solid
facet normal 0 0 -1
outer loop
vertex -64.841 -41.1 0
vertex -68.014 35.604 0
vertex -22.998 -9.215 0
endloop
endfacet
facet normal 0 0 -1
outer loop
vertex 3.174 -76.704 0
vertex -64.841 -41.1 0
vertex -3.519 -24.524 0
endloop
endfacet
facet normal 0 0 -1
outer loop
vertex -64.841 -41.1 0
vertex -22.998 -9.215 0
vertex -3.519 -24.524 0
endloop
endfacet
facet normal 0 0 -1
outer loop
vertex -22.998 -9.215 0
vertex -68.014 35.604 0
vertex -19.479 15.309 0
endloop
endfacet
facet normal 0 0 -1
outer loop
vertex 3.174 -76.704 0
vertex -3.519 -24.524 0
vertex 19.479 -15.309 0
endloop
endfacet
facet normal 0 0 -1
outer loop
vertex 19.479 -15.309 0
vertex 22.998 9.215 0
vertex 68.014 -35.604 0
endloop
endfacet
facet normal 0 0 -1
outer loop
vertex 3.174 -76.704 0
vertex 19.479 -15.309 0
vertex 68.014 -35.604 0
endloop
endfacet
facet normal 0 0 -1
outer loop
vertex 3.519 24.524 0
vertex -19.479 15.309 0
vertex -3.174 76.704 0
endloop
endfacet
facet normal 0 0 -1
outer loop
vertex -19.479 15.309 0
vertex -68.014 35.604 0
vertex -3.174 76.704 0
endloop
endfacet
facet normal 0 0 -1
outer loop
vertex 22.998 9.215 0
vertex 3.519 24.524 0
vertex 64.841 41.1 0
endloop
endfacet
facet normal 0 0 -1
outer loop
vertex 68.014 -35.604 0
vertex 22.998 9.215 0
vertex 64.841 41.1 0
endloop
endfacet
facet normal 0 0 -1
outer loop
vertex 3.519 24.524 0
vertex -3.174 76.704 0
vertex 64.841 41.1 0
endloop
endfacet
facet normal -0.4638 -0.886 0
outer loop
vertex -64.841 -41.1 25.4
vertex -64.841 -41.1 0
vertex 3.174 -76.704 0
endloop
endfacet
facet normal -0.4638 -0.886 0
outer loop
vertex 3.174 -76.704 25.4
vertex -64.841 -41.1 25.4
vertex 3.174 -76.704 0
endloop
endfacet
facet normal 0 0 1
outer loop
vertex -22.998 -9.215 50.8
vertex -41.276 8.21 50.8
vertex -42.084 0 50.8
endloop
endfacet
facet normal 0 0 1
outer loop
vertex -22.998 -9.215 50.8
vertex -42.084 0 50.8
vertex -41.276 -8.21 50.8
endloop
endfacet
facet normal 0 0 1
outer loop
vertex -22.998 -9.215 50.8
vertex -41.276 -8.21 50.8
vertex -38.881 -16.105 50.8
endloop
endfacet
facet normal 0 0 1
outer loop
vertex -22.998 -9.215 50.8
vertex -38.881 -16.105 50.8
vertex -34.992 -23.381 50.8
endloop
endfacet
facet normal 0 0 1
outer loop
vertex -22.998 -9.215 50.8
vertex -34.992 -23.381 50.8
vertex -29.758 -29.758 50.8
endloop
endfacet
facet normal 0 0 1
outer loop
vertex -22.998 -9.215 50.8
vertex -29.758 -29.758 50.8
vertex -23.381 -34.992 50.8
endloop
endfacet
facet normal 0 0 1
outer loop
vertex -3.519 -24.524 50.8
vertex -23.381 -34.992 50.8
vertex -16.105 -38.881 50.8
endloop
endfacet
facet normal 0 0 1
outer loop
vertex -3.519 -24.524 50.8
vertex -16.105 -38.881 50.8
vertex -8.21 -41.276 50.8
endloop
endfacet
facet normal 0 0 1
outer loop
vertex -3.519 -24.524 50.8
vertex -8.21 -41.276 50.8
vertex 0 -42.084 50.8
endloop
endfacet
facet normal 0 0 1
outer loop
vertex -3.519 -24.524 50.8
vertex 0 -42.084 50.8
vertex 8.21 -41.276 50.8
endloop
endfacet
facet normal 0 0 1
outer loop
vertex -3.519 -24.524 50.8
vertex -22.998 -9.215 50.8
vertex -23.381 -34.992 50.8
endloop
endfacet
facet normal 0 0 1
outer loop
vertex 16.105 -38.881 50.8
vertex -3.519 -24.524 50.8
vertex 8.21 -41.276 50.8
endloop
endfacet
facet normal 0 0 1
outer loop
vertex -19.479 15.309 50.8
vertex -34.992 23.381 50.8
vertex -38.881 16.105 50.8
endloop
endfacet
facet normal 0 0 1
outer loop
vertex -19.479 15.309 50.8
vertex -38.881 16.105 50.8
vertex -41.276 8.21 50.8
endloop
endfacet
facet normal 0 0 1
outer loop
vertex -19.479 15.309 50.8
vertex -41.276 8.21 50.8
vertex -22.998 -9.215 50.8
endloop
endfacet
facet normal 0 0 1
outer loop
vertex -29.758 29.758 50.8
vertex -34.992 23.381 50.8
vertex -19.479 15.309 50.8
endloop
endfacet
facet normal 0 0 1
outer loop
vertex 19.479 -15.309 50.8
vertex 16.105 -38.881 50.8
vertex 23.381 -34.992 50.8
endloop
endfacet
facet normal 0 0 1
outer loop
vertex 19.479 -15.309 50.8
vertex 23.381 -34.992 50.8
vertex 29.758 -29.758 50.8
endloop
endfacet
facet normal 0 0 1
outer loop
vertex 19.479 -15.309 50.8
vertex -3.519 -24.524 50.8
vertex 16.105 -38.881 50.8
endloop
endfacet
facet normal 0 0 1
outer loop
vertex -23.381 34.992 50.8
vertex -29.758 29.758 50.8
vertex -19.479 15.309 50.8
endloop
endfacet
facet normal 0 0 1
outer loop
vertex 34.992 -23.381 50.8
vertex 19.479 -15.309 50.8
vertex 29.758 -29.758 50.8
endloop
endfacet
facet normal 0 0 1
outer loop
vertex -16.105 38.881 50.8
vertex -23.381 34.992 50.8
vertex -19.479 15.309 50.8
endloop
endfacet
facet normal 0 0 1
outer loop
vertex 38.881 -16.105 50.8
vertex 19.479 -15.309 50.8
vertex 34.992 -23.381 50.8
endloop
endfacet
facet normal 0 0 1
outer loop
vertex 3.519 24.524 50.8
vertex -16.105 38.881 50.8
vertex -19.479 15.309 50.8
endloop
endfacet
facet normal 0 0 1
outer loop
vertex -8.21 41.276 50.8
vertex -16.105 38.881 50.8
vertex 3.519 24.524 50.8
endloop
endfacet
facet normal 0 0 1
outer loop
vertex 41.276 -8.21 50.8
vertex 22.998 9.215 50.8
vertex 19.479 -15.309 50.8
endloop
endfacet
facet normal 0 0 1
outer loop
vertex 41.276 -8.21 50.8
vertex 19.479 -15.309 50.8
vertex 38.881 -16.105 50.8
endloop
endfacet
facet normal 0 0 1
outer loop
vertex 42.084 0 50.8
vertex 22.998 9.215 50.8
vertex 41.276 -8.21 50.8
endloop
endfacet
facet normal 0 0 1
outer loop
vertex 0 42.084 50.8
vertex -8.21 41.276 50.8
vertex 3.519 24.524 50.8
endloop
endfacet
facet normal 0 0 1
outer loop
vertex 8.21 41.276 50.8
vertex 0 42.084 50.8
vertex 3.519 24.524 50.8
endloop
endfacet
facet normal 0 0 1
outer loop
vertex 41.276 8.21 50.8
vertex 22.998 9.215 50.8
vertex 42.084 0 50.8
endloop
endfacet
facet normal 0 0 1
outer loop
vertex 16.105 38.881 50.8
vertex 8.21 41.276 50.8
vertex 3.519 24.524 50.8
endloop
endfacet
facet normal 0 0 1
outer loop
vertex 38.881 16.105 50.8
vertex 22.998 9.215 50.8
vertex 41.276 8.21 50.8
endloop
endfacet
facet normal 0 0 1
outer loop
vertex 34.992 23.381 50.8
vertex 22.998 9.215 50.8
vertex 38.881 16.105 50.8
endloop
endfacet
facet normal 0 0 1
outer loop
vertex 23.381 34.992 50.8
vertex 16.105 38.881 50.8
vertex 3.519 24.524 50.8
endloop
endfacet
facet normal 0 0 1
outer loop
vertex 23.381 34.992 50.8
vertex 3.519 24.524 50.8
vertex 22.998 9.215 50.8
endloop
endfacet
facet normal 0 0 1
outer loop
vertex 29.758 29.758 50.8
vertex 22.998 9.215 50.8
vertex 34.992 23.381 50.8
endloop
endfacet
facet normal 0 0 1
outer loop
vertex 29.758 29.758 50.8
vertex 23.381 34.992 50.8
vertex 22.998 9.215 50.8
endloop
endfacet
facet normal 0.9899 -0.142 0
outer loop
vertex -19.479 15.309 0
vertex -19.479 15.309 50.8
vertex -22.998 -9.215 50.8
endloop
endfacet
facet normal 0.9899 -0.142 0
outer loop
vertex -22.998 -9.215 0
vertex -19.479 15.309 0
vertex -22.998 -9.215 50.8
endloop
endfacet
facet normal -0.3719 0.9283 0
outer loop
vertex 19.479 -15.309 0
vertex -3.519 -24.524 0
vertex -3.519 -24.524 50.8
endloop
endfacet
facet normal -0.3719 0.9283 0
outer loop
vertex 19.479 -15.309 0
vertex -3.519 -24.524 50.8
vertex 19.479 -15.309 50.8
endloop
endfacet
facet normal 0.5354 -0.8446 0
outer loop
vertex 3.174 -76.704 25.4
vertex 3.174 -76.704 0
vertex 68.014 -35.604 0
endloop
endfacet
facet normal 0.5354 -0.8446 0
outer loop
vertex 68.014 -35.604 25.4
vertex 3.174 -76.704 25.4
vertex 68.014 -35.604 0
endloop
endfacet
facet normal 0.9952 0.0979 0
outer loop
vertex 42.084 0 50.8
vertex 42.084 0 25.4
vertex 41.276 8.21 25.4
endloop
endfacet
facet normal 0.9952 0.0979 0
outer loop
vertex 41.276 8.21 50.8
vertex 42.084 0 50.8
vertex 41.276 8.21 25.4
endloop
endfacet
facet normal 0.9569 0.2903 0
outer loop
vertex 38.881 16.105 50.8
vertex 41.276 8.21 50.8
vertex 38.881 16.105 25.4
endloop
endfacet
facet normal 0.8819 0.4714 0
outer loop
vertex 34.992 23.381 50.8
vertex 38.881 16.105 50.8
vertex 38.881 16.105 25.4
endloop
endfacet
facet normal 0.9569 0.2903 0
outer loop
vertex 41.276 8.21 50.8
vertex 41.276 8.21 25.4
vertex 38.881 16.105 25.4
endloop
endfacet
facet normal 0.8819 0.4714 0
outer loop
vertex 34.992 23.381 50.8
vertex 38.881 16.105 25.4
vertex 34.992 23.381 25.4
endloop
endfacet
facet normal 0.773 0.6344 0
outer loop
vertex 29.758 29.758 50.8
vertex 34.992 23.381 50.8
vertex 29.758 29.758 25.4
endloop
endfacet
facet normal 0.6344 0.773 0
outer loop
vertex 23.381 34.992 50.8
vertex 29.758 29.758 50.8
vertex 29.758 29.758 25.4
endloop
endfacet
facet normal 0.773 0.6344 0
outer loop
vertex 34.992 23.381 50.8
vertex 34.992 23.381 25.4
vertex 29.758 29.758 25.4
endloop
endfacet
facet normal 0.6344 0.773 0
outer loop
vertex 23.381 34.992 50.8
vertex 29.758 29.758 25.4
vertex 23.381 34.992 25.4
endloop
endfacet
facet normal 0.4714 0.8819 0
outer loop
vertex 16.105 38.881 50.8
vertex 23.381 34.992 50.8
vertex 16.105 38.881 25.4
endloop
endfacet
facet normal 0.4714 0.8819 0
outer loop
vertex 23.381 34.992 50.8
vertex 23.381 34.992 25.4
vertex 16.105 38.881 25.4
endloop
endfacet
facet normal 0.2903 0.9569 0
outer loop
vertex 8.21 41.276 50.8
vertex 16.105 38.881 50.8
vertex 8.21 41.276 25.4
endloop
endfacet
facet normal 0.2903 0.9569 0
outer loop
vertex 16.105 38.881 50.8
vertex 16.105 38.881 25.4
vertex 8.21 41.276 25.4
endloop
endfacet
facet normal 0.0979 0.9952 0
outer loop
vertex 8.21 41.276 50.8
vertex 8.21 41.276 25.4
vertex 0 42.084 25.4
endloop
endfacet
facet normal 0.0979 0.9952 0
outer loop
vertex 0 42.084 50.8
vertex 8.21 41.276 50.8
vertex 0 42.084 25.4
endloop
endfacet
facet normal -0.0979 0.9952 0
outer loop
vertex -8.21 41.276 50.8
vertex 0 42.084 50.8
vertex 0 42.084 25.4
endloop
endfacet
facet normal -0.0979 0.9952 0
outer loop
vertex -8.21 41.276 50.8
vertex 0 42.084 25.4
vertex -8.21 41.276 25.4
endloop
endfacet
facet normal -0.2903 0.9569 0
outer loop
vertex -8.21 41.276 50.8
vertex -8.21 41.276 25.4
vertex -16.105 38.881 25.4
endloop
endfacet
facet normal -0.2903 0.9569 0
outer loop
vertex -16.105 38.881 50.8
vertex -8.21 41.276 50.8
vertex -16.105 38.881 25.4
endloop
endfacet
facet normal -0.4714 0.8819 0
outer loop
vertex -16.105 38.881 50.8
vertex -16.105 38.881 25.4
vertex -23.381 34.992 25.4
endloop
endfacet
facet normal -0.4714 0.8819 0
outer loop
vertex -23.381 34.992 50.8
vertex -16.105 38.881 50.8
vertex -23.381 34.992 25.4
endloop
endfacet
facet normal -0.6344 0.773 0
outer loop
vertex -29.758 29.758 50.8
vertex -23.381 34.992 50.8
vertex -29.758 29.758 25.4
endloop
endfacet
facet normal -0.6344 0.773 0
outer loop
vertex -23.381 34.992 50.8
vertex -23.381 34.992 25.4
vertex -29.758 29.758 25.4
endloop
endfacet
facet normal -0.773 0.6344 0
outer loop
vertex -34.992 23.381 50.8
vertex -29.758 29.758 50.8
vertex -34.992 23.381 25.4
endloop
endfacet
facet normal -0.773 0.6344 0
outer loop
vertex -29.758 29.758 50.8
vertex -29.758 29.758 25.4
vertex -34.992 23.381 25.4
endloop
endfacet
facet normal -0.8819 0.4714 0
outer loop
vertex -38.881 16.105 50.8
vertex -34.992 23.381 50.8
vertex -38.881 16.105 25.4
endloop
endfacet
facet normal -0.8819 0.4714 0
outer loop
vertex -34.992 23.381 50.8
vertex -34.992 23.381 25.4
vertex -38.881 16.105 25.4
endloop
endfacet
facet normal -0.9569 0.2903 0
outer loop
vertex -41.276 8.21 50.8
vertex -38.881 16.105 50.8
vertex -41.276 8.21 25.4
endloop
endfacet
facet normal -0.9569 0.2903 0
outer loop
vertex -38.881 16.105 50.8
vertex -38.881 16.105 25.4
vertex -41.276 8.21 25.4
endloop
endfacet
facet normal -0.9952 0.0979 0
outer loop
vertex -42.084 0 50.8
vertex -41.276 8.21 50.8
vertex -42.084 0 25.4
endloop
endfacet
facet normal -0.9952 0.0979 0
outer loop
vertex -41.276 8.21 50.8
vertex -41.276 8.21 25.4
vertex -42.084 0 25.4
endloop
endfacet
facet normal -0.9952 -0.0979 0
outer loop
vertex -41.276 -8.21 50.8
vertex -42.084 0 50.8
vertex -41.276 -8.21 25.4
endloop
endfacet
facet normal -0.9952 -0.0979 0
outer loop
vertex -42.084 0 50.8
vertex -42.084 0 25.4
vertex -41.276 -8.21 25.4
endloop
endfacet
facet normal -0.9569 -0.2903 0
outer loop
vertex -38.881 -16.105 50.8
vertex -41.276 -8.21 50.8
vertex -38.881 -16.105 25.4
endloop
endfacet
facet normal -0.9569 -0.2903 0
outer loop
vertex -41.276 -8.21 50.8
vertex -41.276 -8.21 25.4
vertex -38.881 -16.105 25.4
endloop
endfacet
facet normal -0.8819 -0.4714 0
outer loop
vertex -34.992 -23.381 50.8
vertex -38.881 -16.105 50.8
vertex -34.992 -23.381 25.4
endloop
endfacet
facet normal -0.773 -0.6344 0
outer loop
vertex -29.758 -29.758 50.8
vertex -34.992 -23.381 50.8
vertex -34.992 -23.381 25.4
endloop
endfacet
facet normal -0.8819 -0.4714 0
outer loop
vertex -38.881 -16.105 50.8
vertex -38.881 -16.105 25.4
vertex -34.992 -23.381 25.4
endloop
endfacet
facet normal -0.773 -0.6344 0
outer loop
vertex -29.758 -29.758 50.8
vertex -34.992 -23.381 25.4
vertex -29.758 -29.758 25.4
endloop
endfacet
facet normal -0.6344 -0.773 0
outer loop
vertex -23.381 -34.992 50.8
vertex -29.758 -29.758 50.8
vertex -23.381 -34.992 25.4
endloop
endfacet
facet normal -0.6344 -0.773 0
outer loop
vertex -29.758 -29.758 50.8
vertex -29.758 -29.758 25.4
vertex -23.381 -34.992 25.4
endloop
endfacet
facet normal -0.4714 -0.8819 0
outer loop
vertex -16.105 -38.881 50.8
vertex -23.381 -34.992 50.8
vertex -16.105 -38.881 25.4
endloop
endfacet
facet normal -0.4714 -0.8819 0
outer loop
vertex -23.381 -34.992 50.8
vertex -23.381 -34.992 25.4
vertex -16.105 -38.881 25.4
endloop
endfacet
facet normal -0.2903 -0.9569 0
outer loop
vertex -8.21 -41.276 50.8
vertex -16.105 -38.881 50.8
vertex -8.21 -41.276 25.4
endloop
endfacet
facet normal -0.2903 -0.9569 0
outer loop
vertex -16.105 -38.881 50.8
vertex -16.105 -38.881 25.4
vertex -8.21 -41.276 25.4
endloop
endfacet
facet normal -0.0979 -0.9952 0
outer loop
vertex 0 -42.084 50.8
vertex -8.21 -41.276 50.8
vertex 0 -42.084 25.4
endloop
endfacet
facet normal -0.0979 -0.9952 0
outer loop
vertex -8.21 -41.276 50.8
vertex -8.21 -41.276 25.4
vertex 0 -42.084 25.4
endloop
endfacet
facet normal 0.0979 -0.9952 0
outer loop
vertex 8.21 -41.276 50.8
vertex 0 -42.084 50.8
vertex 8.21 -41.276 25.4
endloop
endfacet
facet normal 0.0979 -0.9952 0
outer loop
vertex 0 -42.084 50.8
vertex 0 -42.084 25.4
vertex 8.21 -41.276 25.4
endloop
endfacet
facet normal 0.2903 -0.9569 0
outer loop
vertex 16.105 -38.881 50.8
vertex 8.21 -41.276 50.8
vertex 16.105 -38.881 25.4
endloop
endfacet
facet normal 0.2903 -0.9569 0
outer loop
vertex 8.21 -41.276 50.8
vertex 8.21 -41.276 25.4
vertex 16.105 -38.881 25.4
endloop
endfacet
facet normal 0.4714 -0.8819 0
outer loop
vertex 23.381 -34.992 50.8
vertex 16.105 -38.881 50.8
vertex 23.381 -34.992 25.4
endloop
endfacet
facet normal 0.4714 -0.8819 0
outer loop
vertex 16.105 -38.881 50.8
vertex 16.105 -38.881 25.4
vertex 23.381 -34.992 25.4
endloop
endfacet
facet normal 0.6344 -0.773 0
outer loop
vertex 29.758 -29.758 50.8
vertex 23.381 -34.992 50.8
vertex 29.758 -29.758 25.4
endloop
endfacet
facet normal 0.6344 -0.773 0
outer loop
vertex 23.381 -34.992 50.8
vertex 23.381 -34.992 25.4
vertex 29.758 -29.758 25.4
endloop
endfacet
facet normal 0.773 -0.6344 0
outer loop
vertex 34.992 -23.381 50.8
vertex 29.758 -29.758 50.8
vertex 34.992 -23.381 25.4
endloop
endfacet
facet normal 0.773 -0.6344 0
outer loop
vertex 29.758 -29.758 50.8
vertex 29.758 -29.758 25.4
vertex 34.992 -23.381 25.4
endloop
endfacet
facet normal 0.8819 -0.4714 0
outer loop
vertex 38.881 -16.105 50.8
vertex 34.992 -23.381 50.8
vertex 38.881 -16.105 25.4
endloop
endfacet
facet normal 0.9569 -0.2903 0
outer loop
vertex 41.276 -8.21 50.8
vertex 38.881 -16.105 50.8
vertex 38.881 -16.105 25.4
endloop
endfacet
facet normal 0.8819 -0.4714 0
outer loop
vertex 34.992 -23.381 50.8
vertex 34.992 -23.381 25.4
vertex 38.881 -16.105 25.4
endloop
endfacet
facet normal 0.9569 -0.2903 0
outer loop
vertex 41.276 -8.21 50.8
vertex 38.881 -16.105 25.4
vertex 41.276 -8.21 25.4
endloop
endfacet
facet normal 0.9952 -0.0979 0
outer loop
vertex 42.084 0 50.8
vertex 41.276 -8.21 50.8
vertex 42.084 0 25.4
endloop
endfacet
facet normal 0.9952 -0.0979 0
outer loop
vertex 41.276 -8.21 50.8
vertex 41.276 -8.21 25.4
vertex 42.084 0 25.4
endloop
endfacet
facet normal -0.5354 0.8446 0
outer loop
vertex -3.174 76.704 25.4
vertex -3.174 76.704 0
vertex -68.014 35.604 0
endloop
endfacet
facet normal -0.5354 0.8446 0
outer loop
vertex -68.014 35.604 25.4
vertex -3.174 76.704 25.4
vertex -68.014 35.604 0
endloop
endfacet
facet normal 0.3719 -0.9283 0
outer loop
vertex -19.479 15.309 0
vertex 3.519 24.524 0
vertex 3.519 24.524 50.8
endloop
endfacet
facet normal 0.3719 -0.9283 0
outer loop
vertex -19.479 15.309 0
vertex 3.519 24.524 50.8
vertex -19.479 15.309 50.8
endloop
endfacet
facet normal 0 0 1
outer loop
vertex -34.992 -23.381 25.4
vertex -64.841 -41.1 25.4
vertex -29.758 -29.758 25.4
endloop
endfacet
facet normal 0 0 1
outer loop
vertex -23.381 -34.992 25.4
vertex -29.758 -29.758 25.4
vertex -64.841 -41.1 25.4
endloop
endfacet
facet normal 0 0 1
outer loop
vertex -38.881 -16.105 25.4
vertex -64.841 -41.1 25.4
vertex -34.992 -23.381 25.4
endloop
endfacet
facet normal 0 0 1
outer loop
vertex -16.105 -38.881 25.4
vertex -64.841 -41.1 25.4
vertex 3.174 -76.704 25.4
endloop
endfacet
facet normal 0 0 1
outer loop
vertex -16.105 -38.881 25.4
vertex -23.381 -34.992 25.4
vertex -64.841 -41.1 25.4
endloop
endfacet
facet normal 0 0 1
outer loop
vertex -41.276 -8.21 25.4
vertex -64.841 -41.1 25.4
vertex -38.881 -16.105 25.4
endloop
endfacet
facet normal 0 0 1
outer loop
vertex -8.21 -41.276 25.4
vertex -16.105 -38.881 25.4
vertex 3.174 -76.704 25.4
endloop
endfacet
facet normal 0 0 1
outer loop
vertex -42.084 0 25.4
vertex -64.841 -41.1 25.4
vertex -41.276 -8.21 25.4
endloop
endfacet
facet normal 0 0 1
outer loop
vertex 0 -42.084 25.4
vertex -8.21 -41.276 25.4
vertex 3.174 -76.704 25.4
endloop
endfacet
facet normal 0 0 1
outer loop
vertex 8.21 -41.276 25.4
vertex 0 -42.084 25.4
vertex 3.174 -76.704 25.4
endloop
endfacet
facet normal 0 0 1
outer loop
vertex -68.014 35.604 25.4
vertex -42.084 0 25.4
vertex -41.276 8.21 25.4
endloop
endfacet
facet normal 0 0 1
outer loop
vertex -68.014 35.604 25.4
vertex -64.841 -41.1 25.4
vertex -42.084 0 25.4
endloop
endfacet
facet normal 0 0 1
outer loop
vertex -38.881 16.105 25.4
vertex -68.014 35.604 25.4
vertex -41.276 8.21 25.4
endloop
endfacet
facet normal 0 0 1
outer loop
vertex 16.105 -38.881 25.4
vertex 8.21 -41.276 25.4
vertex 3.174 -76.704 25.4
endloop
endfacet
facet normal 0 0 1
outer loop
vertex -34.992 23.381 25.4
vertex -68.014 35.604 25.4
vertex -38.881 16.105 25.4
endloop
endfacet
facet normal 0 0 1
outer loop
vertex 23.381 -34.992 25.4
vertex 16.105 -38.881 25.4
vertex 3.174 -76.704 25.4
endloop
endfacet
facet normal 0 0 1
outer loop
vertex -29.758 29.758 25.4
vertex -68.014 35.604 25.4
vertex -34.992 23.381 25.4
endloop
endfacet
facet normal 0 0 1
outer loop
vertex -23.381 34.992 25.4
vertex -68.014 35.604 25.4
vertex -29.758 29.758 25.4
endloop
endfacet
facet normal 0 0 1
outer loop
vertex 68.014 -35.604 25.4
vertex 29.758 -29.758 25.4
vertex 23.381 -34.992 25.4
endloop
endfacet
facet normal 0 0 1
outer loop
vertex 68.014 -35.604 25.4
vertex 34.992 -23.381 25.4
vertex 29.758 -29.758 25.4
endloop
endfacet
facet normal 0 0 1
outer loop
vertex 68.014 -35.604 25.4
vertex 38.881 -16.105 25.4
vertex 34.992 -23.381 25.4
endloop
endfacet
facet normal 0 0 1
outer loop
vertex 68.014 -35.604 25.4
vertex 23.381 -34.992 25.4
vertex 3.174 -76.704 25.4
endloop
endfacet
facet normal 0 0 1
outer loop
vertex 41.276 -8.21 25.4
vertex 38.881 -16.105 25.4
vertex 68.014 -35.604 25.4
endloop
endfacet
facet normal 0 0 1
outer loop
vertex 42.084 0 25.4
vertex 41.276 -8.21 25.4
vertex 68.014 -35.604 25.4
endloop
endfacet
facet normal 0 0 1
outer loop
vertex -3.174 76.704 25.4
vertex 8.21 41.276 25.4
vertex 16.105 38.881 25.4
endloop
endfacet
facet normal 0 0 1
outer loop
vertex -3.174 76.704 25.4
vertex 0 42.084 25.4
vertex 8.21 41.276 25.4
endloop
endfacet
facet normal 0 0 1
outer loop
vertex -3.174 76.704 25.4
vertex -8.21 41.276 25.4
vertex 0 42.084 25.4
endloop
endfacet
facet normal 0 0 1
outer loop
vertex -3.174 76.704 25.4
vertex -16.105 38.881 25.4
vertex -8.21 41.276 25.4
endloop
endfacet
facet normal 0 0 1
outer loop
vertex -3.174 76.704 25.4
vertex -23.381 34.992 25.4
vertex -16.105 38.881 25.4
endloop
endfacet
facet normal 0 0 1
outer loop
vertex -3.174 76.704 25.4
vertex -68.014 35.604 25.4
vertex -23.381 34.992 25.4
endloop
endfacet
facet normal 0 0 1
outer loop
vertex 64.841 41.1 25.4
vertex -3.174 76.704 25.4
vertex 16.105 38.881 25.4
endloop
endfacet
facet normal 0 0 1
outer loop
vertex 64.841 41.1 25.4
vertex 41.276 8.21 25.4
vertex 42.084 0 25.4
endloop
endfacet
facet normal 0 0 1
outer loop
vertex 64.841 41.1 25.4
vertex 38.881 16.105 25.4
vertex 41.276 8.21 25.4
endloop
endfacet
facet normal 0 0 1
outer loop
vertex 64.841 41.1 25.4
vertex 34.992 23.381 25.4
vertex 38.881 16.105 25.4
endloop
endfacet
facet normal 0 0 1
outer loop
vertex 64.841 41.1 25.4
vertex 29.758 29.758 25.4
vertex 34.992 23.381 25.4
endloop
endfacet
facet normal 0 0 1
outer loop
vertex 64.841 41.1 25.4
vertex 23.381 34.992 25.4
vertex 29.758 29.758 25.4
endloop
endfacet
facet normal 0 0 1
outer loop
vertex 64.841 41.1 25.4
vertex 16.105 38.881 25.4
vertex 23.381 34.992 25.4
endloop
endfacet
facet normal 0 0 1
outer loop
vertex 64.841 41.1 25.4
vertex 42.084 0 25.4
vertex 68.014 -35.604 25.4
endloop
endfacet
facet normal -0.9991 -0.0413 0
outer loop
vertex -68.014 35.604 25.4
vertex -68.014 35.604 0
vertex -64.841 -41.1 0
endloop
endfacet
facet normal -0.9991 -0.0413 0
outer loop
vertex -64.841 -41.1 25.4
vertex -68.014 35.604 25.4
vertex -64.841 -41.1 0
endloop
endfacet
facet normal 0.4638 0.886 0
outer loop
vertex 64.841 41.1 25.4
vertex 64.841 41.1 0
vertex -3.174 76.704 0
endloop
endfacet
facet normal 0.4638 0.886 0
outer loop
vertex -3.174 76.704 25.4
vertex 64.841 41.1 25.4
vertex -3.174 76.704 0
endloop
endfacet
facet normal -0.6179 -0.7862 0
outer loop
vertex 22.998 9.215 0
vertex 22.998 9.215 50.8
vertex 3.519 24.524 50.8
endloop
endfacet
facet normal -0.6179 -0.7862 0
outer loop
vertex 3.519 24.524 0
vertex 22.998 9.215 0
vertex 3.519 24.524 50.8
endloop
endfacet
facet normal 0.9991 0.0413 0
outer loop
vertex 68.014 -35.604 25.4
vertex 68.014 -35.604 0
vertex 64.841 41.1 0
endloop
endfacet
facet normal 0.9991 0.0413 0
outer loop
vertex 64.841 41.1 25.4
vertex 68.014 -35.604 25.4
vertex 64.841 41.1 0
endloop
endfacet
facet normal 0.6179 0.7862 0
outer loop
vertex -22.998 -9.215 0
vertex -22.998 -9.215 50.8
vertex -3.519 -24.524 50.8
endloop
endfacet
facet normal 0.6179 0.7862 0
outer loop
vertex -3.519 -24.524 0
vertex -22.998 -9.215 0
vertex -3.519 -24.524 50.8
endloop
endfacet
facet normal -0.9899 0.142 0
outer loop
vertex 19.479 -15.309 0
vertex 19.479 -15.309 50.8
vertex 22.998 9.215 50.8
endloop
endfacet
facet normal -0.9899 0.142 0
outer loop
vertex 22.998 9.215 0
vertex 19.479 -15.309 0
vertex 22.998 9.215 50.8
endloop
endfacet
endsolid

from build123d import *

# Parameters (mm, degrees)
F1_DEPTH = 25.4
F2_R     = 42.08433
F3_DEPTH = 25.4
F5_DEPTH = 50.8


with BuildPart() as f1:
    # F0 (on Top) → F1 (new body)
    with BuildSketch(Plane.XY):
        Polygon((-3.173529, 76.703862), (-68.014258, 35.603574), (-64.840729, -41.100288), (3.173529, -76.703862), (68.014258, -35.603574), (64.840729, 41.100288), align=None)
    extrude(amount=F1_DEPTH)

    # F2 (on face) → F3 (join)
    with BuildSketch(Plane.XY.offset(25.4)):
        Circle(F2_R)
    extrude(amount=F3_DEPTH)

    # F4 (on face) → F5 (cut, through all)
    with BuildSketch(Plane.XY.offset(50.8)):
        Polygon((3.518755, 24.523791), (-19.478848, 15.309226), (-22.997603, -9.214564), (-3.518755, -24.523791), (19.478848, -15.309226), (22.997603, 9.214564), align=None)
    extrude(amount=-F5_DEPTH, mode=Mode.SUBTRACT)


solid = f1.part
